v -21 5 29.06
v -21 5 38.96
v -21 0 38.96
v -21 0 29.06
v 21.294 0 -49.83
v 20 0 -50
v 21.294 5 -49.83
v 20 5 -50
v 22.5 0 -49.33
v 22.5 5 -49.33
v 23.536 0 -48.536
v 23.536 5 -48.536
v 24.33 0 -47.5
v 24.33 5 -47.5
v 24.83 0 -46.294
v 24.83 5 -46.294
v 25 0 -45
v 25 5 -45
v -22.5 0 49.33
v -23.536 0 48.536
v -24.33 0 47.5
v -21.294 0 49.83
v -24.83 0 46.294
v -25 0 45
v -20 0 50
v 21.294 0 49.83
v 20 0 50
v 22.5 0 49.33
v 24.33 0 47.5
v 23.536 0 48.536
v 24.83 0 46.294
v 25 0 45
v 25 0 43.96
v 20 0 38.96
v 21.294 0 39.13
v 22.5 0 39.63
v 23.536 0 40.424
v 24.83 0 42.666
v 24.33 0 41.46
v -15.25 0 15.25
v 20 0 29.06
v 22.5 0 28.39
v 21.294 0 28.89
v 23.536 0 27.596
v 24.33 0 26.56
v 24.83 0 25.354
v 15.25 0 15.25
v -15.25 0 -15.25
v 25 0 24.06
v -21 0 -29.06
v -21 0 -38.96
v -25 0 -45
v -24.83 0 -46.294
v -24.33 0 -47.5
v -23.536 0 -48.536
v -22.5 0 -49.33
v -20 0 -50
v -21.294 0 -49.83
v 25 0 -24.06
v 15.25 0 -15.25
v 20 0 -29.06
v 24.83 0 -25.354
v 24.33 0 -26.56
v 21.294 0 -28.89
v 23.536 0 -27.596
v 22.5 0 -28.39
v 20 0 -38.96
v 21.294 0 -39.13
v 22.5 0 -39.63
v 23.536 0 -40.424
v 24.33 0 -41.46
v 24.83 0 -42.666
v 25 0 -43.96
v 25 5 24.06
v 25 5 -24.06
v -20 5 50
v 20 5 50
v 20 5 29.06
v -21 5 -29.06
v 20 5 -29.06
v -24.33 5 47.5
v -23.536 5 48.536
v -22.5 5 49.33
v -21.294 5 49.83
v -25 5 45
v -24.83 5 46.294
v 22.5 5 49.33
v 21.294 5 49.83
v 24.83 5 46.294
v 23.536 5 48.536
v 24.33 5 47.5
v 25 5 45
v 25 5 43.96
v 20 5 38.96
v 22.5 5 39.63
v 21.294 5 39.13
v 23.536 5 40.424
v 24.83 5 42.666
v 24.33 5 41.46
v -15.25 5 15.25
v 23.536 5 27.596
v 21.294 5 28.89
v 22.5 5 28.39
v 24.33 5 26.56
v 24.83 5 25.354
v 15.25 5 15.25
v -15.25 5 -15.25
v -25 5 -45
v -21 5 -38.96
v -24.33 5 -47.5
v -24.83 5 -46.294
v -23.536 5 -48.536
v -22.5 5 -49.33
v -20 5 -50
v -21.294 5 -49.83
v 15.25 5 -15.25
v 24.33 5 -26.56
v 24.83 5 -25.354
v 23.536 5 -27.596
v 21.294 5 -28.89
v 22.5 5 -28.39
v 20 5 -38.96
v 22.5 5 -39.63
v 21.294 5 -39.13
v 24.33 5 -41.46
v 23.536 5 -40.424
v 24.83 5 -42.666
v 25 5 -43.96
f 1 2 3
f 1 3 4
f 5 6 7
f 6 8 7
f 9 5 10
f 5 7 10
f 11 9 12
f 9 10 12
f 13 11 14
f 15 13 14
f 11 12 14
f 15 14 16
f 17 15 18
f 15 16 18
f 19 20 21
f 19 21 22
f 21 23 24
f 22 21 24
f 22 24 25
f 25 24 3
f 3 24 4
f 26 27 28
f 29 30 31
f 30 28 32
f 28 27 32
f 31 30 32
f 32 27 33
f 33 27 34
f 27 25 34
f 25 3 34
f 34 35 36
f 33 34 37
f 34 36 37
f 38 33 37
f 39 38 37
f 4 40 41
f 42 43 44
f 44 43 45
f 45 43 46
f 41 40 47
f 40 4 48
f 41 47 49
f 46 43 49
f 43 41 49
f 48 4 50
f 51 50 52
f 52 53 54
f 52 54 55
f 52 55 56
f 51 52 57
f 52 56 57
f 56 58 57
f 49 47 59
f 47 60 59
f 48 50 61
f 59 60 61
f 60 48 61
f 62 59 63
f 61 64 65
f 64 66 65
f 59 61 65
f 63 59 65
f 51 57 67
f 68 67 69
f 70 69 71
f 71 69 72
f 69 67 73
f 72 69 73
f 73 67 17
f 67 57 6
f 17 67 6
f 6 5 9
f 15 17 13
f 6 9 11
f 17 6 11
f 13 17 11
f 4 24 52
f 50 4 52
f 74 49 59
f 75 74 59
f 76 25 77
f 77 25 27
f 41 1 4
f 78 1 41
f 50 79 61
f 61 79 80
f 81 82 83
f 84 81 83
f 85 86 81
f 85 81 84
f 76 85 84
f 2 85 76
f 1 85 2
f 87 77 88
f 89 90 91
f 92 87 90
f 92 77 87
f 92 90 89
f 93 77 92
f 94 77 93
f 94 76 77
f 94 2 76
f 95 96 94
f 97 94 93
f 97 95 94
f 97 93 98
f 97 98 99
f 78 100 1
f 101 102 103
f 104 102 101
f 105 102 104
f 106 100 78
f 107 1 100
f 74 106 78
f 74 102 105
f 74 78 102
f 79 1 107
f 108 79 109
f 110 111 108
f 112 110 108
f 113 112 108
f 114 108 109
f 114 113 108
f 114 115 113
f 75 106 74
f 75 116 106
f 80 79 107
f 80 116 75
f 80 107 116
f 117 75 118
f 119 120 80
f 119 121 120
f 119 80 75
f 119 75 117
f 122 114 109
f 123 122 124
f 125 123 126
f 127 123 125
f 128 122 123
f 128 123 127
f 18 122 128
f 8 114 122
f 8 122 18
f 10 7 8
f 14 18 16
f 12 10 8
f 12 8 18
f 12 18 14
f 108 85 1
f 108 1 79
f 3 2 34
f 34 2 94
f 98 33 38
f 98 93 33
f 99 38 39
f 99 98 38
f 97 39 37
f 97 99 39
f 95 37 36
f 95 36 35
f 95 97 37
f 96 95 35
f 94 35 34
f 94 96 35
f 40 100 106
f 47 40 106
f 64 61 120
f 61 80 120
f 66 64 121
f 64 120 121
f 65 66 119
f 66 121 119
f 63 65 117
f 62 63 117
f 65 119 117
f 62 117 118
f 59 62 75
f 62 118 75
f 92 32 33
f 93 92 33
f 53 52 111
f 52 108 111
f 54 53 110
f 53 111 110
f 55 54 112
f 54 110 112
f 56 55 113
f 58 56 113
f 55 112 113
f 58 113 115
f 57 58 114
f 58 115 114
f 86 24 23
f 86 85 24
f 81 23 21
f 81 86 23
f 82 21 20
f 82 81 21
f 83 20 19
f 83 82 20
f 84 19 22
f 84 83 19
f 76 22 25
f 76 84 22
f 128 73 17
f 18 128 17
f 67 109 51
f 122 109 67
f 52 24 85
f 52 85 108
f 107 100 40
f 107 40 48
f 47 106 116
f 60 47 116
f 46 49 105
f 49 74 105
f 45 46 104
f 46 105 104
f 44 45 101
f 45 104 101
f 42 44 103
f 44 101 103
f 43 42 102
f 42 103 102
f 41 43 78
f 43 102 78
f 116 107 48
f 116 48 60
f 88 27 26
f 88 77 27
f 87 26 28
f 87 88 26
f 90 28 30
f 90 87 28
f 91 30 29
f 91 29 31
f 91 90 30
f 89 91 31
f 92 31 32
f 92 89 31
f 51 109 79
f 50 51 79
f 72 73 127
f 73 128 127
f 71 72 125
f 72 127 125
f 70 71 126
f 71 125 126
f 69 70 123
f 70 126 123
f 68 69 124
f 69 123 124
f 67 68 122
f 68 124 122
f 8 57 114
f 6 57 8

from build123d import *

# Parameters (mm, degrees)
SKETCH1_W           = 50
SKETCH1_H           = 100
BOSS_EXTRUDE1_DEPTH = 5
SKETCH2_W           = 52.895350152
SKETCH2_H           = 9.9
CUT_EXTRUDE1_DEPTH  = 6
FILLET1_R           = 5
SKETCH3_W           = 30.5
SKETCH3_H           = 30.5
CUT_EXTRUDE2_DEPTH  = 6


with BuildPart() as part:
    # Sketch1 → Boss-Extrude1 (new body)
    with BuildSketch(Plane(origin=(0, 0, 0), x_dir=(1, 0, 0), z_dir=(0, 1, 0))):
        Rectangle(SKETCH1_W, SKETCH1_H)
    extrude(amount=BOSS_EXTRUDE1_DEPTH)

    # Sketch2 → Cut-Extrude1 (cut, through all)
    with BuildSketch(Plane(origin=(0, 5, 0), x_dir=(1, 0, 0), z_dir=(0, 1, 0))):
        with Locations((5.447675076, -34.01)):
            Rectangle(SKETCH2_W, SKETCH2_H)
    cut_extrude1 = extrude(amount=-CUT_EXTRUDE1_DEPTH, mode=Mode.SUBTRACT)

    # Mirror1: Cut-Extrude1 across plane
    add(cut_extrude1.mirror(Plane.XY), mode=Mode.SUBTRACT)

    # Fillet1
    fillet1_edges = [part.edges().sort_by_distance(p)[0] for p in [
        (25, 2.5, 38.96),
        (25, 2.5, 29.06),
        (25, 2.5, -29.06),
        (25, 2.5, -38.96),
        (25, 2.5, 50),
        (-25, 2.5, 50),
        (-25, 2.5, -50),
        (25, 2.5, -50),
    ]]
    fillet(fillet1_edges, radius=FILLET1_R)

    # Sketch3 → Cut-Extrude2 (cut, through all)
    with BuildSketch(Plane(origin=(0, 5, 0), x_dir=(1, 0, 0), z_dir=(0, 1, 0))):
        Rectangle(SKETCH3_W, SKETCH3_H)
    extrude(amount=-CUT_EXTRUDE2_DEPTH, mode=Mode.SUBTRACT)


solid = part.part
